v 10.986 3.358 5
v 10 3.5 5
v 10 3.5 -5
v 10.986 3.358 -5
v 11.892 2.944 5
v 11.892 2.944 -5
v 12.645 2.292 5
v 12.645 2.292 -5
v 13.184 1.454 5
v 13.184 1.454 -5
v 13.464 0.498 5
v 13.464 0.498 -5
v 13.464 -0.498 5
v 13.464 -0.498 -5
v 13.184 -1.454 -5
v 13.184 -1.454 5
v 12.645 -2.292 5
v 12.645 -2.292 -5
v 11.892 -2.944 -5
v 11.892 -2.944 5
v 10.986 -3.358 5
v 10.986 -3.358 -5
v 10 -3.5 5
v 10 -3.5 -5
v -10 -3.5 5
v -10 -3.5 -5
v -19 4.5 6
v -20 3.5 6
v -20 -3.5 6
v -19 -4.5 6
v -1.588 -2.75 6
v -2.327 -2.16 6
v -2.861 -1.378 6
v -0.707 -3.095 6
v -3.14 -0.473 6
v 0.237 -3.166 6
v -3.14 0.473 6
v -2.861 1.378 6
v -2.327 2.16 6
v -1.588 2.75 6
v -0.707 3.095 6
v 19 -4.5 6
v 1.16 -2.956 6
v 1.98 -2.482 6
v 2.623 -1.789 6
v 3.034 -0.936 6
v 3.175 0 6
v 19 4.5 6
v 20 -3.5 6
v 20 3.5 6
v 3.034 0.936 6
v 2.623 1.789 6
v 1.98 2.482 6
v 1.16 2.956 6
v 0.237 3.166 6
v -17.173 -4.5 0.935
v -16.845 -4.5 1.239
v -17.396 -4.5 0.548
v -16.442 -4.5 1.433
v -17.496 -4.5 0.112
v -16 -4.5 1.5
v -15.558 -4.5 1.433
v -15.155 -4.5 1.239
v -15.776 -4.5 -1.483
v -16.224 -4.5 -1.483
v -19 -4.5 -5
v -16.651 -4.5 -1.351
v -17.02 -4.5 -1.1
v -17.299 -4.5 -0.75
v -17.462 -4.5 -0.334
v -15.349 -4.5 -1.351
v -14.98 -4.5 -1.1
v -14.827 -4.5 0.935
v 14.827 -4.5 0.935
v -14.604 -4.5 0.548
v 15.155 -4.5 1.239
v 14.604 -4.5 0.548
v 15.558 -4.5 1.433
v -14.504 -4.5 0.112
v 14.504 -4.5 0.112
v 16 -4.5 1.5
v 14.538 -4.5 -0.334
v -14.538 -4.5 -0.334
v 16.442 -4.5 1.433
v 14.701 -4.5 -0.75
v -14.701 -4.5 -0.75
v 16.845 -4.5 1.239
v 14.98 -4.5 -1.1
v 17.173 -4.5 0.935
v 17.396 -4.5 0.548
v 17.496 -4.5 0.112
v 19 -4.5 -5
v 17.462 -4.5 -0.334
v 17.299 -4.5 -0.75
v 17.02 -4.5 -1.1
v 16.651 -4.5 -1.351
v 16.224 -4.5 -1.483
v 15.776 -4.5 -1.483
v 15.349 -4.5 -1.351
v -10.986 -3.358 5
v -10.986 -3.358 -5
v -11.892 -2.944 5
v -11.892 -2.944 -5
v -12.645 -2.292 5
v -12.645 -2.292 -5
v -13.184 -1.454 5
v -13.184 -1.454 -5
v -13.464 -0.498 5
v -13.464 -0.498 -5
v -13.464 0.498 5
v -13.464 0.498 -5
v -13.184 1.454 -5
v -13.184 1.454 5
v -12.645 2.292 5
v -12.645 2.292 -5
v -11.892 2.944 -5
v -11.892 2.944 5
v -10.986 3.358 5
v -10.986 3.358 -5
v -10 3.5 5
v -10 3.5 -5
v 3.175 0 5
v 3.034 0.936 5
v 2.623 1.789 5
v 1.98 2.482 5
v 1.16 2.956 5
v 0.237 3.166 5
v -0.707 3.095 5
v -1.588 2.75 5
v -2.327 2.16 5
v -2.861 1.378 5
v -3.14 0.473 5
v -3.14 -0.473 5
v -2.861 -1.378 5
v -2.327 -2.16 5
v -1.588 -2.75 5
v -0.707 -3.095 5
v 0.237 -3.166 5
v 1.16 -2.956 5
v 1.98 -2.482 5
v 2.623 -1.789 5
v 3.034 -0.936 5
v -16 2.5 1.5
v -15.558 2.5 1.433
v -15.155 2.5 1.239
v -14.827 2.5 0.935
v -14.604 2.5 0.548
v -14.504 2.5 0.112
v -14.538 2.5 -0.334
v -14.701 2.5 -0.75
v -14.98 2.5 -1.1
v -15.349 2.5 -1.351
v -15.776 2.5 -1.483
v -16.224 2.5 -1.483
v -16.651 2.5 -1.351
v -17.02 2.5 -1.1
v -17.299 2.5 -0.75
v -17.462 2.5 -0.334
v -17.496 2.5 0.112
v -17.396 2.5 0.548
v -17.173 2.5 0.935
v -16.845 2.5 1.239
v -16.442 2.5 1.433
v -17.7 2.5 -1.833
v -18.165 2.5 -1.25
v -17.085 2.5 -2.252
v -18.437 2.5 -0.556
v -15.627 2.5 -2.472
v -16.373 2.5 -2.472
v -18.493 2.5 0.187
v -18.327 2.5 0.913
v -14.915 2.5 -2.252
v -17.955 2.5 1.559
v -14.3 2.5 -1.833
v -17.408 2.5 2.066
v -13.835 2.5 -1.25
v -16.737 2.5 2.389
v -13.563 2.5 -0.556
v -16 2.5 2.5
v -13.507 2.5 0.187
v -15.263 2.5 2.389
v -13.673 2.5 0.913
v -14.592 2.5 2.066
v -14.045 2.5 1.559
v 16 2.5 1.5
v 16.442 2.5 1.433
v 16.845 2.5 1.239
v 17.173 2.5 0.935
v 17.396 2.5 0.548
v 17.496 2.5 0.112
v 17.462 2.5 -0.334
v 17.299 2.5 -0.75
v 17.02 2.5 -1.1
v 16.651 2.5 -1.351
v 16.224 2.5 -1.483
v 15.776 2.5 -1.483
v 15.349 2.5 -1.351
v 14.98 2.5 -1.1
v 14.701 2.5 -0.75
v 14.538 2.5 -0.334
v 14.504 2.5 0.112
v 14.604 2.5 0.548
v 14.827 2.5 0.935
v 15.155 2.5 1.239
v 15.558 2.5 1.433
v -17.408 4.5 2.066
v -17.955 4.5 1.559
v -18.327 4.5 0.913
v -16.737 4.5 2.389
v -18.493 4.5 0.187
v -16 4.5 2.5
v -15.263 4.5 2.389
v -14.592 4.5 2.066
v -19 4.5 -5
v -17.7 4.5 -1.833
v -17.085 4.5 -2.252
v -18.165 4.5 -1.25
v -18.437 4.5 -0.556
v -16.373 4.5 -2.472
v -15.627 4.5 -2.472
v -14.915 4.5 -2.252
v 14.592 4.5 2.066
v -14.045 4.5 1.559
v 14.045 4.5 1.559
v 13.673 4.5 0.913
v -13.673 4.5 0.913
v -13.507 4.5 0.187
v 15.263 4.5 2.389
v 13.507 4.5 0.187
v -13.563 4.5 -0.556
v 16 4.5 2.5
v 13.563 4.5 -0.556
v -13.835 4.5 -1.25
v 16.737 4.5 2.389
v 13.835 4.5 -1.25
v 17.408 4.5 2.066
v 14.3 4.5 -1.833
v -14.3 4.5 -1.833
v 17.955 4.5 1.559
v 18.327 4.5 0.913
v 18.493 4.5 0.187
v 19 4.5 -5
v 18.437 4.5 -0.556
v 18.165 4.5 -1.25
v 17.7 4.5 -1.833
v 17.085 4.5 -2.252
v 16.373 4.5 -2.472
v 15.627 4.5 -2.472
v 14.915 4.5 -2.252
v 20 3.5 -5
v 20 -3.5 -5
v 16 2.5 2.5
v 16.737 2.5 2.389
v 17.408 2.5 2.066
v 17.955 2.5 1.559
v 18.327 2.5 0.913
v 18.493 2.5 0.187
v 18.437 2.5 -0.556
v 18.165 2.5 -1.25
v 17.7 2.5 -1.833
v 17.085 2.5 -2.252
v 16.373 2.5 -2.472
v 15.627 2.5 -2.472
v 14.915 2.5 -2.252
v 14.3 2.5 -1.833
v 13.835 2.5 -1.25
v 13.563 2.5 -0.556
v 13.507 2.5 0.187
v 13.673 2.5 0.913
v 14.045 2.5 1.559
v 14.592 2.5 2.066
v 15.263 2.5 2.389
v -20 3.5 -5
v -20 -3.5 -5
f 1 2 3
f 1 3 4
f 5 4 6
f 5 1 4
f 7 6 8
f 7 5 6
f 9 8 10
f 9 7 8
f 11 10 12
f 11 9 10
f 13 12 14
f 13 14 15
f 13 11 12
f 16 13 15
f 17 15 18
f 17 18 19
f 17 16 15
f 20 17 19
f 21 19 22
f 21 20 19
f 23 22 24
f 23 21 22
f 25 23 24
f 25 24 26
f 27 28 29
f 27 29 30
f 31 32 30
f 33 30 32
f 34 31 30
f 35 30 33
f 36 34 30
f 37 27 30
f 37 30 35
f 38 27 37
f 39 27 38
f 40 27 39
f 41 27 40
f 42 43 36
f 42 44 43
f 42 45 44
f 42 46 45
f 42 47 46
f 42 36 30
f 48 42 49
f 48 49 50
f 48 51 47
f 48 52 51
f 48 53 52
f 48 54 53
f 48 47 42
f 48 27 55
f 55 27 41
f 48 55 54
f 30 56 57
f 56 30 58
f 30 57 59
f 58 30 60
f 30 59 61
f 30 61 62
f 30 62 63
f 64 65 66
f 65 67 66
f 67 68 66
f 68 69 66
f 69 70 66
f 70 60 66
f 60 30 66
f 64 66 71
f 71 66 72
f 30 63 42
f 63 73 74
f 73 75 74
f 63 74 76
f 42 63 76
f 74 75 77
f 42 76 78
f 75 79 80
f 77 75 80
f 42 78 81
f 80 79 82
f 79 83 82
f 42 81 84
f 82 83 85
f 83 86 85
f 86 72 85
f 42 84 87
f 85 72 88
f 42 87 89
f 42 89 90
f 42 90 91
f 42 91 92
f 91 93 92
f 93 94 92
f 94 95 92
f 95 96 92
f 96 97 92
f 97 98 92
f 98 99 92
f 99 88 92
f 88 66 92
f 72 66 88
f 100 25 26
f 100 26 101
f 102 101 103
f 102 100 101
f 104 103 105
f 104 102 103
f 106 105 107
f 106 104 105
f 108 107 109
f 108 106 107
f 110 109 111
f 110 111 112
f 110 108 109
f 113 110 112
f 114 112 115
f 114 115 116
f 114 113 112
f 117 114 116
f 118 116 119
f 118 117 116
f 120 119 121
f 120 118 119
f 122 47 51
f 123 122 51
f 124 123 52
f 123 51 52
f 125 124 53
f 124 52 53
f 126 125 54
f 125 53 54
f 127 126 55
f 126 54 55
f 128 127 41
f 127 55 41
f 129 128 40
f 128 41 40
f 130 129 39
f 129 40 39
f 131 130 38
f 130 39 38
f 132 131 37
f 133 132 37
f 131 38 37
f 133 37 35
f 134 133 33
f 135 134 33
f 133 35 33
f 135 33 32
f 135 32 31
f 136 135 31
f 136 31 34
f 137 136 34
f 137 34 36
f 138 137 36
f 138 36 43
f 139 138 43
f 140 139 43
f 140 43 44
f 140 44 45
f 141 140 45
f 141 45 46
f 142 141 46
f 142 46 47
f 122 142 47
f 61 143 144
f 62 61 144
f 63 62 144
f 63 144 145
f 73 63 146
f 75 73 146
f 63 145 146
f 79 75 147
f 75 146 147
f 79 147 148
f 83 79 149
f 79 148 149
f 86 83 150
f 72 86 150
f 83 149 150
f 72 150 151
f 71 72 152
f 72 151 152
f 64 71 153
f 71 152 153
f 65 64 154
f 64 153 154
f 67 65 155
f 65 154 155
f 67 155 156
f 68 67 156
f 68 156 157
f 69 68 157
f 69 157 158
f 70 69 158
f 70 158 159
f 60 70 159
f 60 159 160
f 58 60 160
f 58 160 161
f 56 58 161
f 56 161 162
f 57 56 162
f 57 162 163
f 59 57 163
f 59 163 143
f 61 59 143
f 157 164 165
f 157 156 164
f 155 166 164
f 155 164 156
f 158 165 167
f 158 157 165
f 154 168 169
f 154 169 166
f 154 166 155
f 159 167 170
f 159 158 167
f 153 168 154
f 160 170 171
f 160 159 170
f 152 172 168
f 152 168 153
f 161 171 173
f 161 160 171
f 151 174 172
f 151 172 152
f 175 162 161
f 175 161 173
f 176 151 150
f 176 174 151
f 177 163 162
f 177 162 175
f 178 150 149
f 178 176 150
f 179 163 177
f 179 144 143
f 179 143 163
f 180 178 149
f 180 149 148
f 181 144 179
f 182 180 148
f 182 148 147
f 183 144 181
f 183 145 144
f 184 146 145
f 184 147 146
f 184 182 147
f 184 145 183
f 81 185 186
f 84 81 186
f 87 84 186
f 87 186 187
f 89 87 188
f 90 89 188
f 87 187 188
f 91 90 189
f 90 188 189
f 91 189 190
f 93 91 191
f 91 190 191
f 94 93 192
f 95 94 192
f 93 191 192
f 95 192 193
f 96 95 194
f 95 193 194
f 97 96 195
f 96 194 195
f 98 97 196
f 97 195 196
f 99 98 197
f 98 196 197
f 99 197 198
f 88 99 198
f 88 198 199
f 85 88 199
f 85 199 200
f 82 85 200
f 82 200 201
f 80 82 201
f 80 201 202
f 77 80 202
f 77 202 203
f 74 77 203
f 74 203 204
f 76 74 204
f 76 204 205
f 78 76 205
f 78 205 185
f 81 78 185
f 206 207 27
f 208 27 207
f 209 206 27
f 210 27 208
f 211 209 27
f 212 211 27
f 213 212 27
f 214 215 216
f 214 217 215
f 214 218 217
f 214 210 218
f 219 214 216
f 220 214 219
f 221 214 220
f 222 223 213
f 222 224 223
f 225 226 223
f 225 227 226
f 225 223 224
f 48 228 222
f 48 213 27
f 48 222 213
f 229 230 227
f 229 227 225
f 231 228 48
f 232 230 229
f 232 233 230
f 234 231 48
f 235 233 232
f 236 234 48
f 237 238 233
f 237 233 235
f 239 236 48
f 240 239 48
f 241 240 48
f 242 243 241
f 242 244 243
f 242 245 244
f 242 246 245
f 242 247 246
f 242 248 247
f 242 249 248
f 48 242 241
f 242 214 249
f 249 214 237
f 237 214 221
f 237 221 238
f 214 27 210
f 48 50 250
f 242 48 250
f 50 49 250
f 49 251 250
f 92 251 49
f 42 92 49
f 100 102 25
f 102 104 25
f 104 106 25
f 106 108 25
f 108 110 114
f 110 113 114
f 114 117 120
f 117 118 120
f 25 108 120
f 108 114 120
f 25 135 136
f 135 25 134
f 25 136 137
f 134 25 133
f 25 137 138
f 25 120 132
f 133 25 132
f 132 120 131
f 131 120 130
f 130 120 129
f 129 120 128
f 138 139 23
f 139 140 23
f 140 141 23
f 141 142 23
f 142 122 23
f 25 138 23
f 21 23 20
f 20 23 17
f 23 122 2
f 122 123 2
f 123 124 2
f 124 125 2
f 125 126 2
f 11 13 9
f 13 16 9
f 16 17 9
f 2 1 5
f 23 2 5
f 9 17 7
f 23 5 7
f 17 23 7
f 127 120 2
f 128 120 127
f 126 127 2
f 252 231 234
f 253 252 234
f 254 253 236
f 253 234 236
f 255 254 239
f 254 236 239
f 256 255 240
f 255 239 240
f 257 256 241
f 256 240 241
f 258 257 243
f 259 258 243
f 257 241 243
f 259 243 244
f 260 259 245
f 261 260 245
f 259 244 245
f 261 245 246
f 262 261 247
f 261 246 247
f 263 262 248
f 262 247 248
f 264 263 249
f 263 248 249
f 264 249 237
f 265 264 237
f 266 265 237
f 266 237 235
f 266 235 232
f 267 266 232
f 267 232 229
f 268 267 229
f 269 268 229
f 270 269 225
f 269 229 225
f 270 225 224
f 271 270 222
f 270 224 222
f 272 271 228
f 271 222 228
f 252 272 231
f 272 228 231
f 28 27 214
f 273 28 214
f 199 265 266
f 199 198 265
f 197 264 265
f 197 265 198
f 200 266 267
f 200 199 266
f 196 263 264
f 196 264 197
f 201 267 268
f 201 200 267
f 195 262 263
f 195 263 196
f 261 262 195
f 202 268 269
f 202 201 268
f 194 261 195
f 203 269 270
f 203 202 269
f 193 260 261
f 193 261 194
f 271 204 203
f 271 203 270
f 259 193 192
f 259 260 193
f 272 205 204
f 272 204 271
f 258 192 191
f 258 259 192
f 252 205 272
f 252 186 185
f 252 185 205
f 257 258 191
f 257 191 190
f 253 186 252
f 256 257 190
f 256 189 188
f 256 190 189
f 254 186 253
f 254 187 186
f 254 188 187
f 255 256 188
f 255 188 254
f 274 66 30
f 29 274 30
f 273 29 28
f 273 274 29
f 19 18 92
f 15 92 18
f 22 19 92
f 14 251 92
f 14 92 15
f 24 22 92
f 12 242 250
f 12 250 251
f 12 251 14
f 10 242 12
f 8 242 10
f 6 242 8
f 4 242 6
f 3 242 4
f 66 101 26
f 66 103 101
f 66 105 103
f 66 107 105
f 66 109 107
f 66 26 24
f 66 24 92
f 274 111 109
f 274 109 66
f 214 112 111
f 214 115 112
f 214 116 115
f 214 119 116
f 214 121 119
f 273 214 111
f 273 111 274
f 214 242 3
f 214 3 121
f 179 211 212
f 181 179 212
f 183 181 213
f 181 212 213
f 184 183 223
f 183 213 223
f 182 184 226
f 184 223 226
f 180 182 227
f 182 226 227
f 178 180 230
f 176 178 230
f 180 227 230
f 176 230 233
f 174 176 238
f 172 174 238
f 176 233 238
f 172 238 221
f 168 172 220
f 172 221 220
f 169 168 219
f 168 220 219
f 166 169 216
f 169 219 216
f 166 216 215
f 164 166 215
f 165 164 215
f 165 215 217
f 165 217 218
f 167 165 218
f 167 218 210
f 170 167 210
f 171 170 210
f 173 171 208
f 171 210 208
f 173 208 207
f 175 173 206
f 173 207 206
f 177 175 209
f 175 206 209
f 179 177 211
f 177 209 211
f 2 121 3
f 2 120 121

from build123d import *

# Parameters (mm, degrees)
BOSS_EXTRUDE1_DEPTH = 5
BOSS_EXTRUDE2_START = 5
SKETCH2_2_W         = 40
SKETCH2_2_H         = 9
BOSS_EXTRUDE2_DEPTH = 1
CUT_EXTRUDE1_REACH  = 25.265
SKETCH3_R           = 3.175
SKETCH7_R           = 2.5
CUT_EXTRUDE2_DEPTH  = 2
SKETCH7_3_R         = 1.5
CUT_EXTRUDE3_DEPTH  = 23.737634002
CHAMFER1_SIZE       = 1


with BuildPart() as part:
    # Sketch2 → Boss-Extrude1 (new, symmetric)
    with BuildSketch(Plane.XY):
        Polygon((-10, 4.5), (10, 4.5), (20, 4.5), (20, -4.5), (10, -4.5), (-10, -4.5), (-20, -4.5), (-20, 4.5), align=None)
        with BuildLine():
            Line((-10, 3.5), (10, 3.5))
            ThreePointArc((10, 3.5), (13.5, 0), (10, -3.5))
            Line((10, -3.5), (-10, -3.5))
            ThreePointArc((-10, -3.5), (-13.5, 0), (-10, 3.5))
        make_face(mode=Mode.SUBTRACT)
    extrude(amount=BOSS_EXTRUDE1_DEPTH, both=True)

    # Sketch2<2> → Boss-Extrude2 (add)
    with BuildSketch(Plane.XY.offset(BOSS_EXTRUDE2_START)):
        Rectangle(SKETCH2_2_W, SKETCH2_2_H)
    extrude(amount=BOSS_EXTRUDE2_DEPTH)

    # Sketch3 → Cut-Extrude1 (cut, up to next)
    with BuildSketch(Plane.XY.offset(6), mode=Mode.PRIVATE) as cut_extrude1_sk1:
        Circle(SKETCH3_R)
    cut_extrude1_tool1 = extrude(cut_extrude1_sk1.sketch, amount=-CUT_EXTRUDE1_REACH, mode=Mode.PRIVATE) & part.part
    add(cut_extrude1_tool1.solids().sort_by_distance((0, 0, 6))[0], mode=Mode.SUBTRACT)

    # Sketch7 → Cut-Extrude2 (cut)
    with BuildSketch(Plane(origin=(0, 4.5, 0), x_dir=(1, 0, 0), z_dir=(0, 1, 0))):
        with Locations((-16, 0)):
            Circle(SKETCH7_R)
        with Locations((16, 0)):
            Circle(SKETCH7_R)
    extrude(amount=-CUT_EXTRUDE2_DEPTH, mode=Mode.SUBTRACT)

    # Sketch7<3> → Cut-Extrude3 (cut, through all)
    with BuildSketch(Plane(origin=(0, 4.5, 0), x_dir=(1, 0, 0), z_dir=(0, 1, 0))):
        with Locations((-16, 0)):
            Circle(SKETCH7_3_R)
        with Locations((16, 0)):
            Circle(SKETCH7_3_R)
    extrude(amount=-CUT_EXTRUDE3_DEPTH, mode=Mode.SUBTRACT)

    # Chamfer1
    chamfer1_edges = [part.edges().sort_by_distance(p)[0] for p in [
        (-20, -4.5, 0.5),
        (20, -4.5, 0.5),
        (20, 4.5, 0.5),
        (-20, 4.5, 0.5),
    ]]
    chamfer(chamfer1_edges, length=CHAMFER1_SIZE)


solid = part.part
